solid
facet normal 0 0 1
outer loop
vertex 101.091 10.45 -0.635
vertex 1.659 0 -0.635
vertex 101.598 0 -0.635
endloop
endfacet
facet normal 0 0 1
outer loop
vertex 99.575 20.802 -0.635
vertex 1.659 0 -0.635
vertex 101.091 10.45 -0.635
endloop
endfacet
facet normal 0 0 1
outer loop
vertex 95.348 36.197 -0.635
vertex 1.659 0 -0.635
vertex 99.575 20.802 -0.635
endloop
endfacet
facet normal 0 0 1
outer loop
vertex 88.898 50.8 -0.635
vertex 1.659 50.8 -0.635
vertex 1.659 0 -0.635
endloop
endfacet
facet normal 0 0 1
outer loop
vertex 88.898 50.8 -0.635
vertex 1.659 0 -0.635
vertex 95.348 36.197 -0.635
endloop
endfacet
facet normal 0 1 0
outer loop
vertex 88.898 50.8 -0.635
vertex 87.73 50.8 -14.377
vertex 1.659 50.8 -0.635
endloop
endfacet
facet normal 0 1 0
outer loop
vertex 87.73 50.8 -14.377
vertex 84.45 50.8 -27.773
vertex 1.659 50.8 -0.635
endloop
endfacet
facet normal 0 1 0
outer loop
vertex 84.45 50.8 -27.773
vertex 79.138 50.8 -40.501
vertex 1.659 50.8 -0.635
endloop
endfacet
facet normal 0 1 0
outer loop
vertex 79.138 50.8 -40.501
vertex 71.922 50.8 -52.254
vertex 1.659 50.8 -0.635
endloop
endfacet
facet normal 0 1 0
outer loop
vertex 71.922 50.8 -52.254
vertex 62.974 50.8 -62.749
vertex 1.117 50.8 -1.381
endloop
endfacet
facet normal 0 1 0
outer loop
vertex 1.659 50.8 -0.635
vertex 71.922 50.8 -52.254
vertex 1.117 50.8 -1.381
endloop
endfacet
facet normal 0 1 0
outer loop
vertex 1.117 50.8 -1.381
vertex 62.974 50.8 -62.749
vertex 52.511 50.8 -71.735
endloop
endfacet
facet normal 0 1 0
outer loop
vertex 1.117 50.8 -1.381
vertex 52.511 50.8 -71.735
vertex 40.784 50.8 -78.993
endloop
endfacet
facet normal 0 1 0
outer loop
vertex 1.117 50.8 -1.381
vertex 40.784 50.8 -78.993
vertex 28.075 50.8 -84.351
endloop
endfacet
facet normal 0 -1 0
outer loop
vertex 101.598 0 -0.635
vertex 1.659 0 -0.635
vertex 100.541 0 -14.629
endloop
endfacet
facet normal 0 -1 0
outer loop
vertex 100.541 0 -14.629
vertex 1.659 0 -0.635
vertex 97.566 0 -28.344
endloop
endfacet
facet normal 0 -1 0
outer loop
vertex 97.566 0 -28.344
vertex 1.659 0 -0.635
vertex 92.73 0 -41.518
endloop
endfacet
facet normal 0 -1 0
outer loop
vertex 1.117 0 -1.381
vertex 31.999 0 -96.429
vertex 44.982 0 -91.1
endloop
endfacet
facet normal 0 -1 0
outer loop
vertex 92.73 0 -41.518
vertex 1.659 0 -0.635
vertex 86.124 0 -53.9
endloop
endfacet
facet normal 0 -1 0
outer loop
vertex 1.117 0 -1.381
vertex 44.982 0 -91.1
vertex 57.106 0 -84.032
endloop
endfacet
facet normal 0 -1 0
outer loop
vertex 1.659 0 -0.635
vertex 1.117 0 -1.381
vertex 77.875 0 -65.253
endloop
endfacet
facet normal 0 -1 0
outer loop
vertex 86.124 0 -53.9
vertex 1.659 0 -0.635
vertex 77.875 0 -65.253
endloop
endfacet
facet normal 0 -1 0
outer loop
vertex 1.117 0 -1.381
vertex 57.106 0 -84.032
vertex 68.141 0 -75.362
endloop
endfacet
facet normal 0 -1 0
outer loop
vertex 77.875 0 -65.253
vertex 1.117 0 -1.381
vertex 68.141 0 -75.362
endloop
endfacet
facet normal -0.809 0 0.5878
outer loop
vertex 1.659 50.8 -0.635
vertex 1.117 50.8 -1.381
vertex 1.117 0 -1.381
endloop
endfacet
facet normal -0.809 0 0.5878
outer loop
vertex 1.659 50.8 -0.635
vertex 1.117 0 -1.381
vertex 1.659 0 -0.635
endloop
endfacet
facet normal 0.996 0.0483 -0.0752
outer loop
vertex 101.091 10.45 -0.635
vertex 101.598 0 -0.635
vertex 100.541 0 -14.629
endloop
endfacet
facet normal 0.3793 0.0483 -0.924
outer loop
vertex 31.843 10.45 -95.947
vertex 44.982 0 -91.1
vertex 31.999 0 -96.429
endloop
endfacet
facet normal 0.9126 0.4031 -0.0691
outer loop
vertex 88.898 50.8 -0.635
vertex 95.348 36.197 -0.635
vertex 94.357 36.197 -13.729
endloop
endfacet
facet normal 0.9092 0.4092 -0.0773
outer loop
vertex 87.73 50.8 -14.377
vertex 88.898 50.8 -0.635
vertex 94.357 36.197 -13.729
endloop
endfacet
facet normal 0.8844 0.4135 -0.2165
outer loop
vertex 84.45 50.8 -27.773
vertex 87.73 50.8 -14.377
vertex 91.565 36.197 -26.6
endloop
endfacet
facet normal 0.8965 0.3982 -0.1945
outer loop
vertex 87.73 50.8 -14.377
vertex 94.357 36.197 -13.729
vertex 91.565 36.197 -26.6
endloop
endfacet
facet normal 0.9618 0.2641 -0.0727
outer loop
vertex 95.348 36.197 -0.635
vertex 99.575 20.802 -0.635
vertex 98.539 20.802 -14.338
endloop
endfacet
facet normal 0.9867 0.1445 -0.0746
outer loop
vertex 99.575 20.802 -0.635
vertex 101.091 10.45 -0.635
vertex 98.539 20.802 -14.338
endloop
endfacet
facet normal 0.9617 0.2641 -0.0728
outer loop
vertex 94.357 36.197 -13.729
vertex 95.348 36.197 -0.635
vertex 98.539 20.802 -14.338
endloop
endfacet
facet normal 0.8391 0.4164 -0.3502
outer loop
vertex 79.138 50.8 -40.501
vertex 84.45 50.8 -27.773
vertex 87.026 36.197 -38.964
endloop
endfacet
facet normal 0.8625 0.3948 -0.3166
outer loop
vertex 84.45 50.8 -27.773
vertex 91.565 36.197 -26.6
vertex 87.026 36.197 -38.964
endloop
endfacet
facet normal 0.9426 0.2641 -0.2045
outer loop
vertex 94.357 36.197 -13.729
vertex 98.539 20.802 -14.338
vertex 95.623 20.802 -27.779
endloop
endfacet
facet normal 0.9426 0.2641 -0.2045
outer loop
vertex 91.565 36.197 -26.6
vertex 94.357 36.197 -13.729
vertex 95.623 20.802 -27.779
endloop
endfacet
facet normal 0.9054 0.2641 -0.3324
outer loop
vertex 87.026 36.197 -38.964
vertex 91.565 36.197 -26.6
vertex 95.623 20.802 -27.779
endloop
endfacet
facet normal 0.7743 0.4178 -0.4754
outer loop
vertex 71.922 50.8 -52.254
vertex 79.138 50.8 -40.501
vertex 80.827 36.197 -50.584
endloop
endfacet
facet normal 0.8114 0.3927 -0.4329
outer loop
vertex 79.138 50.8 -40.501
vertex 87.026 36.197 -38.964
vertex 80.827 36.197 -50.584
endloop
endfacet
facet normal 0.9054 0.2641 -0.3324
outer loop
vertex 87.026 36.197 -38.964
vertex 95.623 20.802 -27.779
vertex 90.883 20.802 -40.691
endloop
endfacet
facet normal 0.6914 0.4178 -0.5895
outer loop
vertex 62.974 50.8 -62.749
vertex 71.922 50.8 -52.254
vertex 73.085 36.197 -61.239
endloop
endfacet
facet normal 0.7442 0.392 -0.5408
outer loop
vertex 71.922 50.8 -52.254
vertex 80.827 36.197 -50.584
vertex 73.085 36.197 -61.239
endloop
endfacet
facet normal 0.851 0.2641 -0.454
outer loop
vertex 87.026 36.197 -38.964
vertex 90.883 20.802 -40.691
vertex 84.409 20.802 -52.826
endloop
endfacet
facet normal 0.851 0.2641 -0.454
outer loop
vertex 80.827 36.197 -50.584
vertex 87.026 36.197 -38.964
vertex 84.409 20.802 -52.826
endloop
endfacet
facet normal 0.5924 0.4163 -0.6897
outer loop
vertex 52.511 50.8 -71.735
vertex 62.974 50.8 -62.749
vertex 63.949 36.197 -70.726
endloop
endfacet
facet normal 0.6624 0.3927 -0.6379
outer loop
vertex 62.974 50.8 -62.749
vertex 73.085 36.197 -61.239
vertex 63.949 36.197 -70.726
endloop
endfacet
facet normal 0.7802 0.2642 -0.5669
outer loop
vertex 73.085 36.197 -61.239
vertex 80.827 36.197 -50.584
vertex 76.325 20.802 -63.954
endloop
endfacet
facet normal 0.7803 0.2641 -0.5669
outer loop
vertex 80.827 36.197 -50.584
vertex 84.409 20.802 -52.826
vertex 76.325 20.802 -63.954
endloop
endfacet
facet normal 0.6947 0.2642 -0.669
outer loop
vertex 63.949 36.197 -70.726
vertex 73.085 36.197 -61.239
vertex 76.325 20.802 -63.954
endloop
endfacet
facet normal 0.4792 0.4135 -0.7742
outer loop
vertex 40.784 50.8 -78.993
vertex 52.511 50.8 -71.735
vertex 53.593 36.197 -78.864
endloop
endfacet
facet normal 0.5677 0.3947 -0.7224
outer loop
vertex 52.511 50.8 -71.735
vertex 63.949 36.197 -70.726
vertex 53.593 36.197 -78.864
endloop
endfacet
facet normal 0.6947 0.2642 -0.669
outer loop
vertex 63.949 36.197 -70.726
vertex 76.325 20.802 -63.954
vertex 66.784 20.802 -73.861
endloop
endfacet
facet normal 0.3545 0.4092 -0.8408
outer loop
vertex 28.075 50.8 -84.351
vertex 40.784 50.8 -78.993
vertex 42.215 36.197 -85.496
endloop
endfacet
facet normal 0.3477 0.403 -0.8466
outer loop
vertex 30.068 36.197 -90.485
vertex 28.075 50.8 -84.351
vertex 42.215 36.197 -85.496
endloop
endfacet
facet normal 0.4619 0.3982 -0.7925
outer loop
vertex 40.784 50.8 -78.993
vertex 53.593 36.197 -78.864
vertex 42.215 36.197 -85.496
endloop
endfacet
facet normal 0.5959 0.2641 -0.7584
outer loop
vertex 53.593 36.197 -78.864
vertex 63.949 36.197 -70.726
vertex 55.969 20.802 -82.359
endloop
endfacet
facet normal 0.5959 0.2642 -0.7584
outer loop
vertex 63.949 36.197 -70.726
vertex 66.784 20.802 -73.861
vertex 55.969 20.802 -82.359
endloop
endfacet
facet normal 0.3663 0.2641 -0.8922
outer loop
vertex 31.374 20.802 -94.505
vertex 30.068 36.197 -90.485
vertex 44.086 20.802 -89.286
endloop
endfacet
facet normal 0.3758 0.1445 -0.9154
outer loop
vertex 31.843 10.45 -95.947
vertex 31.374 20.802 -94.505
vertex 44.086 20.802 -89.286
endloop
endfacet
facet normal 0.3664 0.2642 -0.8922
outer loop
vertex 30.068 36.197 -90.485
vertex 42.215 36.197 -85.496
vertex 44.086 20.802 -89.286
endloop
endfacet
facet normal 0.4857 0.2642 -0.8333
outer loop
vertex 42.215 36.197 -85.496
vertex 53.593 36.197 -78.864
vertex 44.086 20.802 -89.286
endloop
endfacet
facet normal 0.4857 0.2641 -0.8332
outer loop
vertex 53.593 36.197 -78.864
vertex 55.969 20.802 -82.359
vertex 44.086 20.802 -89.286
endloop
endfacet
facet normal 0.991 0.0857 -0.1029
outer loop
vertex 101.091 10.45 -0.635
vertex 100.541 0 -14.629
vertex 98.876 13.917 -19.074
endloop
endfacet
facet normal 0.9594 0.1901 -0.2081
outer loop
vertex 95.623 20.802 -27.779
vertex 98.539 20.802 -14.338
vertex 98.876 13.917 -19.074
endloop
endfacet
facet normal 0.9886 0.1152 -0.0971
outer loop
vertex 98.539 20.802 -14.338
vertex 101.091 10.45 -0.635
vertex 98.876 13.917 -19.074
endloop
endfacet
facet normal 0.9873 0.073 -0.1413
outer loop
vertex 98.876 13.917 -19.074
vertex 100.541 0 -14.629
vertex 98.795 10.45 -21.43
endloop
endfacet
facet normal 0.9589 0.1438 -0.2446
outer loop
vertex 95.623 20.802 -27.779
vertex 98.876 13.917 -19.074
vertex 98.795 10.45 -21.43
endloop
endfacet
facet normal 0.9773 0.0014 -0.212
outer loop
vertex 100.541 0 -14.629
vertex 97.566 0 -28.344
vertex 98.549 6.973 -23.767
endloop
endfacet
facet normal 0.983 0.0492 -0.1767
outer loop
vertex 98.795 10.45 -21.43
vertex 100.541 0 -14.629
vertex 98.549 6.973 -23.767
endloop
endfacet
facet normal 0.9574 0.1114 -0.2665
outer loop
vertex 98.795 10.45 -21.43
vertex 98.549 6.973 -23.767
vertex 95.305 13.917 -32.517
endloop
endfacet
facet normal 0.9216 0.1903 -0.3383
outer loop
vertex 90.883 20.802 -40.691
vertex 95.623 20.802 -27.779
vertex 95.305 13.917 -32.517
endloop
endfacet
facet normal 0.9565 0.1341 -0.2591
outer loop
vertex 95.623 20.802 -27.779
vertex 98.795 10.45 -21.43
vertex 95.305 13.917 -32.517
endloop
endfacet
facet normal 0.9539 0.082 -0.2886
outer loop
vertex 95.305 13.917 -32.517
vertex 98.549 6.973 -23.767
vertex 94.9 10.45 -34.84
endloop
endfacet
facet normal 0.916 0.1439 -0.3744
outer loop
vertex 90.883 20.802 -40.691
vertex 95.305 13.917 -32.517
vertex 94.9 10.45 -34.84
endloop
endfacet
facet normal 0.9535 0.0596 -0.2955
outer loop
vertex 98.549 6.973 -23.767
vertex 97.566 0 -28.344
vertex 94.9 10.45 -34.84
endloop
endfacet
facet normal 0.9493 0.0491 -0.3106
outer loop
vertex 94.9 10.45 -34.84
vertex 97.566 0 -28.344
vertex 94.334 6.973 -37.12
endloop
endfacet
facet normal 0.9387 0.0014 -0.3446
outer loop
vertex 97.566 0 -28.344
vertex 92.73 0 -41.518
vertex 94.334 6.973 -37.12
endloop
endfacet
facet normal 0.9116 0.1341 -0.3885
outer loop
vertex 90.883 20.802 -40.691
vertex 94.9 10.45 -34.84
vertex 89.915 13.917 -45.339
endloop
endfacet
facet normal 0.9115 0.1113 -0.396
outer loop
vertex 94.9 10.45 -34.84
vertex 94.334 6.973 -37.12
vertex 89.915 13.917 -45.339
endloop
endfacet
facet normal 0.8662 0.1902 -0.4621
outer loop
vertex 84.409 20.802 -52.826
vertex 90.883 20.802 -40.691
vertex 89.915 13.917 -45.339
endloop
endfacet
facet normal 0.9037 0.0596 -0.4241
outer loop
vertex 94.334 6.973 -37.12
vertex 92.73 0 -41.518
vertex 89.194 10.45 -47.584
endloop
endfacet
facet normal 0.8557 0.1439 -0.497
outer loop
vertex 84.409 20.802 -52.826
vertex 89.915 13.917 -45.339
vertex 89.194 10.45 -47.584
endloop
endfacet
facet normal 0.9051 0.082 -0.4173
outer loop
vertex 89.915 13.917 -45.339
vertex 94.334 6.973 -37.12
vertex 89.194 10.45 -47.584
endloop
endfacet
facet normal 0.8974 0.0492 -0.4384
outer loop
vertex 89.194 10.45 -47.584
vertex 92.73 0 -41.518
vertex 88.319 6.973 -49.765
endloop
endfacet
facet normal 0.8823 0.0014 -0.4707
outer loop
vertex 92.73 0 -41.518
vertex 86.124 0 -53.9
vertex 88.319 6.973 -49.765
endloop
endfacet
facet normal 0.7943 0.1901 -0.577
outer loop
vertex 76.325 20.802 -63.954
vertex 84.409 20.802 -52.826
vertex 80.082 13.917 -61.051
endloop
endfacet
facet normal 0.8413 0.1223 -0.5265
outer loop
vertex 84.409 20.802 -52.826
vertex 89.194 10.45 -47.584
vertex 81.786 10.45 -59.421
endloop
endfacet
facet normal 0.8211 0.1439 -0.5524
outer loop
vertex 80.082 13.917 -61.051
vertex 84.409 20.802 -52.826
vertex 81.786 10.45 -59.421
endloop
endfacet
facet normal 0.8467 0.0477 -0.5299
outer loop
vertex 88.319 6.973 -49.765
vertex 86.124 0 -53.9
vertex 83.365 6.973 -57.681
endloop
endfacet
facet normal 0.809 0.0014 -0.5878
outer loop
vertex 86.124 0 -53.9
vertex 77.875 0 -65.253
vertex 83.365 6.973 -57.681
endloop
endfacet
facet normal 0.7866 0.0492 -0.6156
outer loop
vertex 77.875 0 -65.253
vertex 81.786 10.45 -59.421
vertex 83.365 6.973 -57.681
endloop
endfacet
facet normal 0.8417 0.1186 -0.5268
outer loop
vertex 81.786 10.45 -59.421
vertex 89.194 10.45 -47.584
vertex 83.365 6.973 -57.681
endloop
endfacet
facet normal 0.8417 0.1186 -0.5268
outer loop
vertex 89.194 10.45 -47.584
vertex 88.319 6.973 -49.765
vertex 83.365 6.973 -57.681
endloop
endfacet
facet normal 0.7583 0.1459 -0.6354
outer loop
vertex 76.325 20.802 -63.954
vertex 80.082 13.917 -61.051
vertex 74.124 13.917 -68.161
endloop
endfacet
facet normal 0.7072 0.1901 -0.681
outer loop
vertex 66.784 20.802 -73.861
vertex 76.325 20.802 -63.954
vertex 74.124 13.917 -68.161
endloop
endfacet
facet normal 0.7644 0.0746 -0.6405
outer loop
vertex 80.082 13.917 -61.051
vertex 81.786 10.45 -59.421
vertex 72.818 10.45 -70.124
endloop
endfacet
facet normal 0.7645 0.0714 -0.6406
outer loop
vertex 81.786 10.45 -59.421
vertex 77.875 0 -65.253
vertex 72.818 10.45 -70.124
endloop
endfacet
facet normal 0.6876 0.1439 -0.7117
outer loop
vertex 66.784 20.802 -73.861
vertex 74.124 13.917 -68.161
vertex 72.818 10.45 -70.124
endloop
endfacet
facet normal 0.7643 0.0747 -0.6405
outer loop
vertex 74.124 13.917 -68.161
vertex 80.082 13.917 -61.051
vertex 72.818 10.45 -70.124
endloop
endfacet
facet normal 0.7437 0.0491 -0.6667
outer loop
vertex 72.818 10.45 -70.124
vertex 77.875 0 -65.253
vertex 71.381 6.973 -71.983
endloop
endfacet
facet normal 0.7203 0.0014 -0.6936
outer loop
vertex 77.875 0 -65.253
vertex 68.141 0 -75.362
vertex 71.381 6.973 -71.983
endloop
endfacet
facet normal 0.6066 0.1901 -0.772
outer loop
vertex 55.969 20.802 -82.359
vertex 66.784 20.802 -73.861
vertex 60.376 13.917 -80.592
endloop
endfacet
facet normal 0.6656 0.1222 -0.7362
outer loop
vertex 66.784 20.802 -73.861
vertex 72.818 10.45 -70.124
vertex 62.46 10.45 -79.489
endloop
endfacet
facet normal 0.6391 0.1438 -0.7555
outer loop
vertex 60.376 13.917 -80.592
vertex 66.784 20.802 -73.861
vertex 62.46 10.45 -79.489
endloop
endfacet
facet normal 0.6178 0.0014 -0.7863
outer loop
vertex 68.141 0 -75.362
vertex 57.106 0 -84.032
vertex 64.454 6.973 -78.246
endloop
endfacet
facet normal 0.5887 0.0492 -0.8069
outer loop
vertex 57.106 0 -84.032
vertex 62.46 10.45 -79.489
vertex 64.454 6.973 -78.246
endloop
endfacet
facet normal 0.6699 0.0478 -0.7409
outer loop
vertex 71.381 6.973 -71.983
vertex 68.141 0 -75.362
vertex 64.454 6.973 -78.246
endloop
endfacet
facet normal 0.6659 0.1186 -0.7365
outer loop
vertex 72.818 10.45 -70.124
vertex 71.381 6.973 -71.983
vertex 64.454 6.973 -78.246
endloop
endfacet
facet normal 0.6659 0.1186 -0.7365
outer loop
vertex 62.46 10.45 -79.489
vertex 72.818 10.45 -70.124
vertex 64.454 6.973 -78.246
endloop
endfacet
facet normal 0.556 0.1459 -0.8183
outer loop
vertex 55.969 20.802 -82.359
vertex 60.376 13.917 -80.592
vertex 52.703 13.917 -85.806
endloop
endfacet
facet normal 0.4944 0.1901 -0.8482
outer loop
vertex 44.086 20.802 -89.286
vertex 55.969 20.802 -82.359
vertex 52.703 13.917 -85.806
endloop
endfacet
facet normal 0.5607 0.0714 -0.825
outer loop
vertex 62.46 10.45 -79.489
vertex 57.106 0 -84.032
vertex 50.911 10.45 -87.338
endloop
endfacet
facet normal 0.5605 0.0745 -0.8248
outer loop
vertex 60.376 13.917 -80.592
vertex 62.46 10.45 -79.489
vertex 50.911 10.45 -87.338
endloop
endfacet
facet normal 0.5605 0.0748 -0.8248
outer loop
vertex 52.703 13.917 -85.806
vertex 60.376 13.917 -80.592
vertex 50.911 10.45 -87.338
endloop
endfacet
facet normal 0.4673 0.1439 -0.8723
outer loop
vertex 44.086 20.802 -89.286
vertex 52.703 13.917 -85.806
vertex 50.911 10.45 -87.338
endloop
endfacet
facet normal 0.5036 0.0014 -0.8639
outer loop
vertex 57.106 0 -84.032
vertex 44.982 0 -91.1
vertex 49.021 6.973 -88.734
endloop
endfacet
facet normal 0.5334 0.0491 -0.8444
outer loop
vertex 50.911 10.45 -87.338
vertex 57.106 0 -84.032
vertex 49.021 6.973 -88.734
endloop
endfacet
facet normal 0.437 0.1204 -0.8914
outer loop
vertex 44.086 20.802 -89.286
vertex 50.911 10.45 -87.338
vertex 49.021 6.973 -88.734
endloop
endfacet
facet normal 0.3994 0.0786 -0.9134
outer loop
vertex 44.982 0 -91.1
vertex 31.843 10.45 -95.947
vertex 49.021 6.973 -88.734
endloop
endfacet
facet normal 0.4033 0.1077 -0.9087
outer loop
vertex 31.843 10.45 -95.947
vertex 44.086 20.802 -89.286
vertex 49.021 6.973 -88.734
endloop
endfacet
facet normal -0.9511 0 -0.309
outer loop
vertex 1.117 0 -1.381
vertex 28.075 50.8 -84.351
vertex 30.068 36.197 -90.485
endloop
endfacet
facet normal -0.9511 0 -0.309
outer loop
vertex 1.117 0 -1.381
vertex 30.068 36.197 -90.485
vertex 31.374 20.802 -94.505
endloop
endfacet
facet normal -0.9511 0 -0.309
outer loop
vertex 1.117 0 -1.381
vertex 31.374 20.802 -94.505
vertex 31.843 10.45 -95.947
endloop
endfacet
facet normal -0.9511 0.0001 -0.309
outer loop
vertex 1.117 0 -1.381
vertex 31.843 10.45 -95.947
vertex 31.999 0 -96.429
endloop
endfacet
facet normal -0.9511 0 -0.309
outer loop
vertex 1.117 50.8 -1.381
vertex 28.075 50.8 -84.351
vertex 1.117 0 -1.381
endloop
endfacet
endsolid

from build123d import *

# Parameters (mm, degrees)
REVOLVE1_ANGLE     = 72
CUT_EXTRUDE2_DEPTH = 0.635
CUT_EXTRUDE3_DEPTH = 0.635
CUT_EXTRUDE4_REACH = 151.001


with BuildPart() as part:
    # Sketch1 → Revolve1 (revolve)
    with BuildSketch(Plane.XY):
        with BuildLine():
            Line((0, 0), (0, 50.8))
            Line((0, 50.8), (88.9, 50.8))
            ThreePointArc((88.9, 50.8), (98.376882891, 26.181720723), (101.6, 0))
            Line((101.6, 0), (0, 0))
        make_face()
    revolve(axis=Axis((0, 0, 0), (0, 1, 0)), revolution_arc=REVOLVE1_ANGLE)

    # Sketch3 → Cut-Extrude2 (cut)
    with BuildSketch(Plane(origin=(0, 0, 0), x_dir=(-0.3090169943749449, 0, 0.9510565162951544), z_dir=(-0.9510565162951544, 0, -0.3090169943749449))):
        with BuildLine():
            Line((0, 50.8), (-88.9, 50.8))
            ThreePointArc((-88.9, 50.8), (-98.376882891, 26.181720723), (-101.6, 0))
            Line((-101.6, 0), (0, 0))
            Line((0, 0), (0, 50.8))
        make_face()
    extrude(amount=-CUT_EXTRUDE2_DEPTH, mode=Mode.SUBTRACT)

    # Sketch4 → Cut-Extrude3 (cut)
    with BuildSketch(Plane.XY):
        with BuildLine():
            Line((0.667678512, 50.8), (0.667678512, 0))
            Line((0.667678512, 0), (101.6, 0))
            ThreePointArc((101.6, 0), (98.376882891, 26.181720723), (88.9, 50.8))
            Line((88.9, 50.8), (0.667678512, 50.8))
        make_face()
    extrude(amount=-CUT_EXTRUDE3_DEPTH, mode=Mode.SUBTRACT)

    # Sketch5 → Cut-Extrude4 (cut, up to next)
    with BuildSketch(Plane(origin=(0, 50.8, 0), x_dir=(1, 0, 0), z_dir=(0, 1, 0)), mode=Mode.PRIVATE) as cut_extrude4_sk1:
        Polygon((1.658905685, 0.635), (0.874002519, 0.635), (1.116550937, 1.38148727), align=None)
    cut_extrude4_tool1 = extrude(cut_extrude4_sk1.sketch, amount=-CUT_EXTRUDE4_REACH, mode=Mode.PRIVATE) & part.part
    add(cut_extrude4_tool1.solids().sort_by_distance((1.216486, 50.8, -0.883829))[0], mode=Mode.SUBTRACT)


solid = part.part
